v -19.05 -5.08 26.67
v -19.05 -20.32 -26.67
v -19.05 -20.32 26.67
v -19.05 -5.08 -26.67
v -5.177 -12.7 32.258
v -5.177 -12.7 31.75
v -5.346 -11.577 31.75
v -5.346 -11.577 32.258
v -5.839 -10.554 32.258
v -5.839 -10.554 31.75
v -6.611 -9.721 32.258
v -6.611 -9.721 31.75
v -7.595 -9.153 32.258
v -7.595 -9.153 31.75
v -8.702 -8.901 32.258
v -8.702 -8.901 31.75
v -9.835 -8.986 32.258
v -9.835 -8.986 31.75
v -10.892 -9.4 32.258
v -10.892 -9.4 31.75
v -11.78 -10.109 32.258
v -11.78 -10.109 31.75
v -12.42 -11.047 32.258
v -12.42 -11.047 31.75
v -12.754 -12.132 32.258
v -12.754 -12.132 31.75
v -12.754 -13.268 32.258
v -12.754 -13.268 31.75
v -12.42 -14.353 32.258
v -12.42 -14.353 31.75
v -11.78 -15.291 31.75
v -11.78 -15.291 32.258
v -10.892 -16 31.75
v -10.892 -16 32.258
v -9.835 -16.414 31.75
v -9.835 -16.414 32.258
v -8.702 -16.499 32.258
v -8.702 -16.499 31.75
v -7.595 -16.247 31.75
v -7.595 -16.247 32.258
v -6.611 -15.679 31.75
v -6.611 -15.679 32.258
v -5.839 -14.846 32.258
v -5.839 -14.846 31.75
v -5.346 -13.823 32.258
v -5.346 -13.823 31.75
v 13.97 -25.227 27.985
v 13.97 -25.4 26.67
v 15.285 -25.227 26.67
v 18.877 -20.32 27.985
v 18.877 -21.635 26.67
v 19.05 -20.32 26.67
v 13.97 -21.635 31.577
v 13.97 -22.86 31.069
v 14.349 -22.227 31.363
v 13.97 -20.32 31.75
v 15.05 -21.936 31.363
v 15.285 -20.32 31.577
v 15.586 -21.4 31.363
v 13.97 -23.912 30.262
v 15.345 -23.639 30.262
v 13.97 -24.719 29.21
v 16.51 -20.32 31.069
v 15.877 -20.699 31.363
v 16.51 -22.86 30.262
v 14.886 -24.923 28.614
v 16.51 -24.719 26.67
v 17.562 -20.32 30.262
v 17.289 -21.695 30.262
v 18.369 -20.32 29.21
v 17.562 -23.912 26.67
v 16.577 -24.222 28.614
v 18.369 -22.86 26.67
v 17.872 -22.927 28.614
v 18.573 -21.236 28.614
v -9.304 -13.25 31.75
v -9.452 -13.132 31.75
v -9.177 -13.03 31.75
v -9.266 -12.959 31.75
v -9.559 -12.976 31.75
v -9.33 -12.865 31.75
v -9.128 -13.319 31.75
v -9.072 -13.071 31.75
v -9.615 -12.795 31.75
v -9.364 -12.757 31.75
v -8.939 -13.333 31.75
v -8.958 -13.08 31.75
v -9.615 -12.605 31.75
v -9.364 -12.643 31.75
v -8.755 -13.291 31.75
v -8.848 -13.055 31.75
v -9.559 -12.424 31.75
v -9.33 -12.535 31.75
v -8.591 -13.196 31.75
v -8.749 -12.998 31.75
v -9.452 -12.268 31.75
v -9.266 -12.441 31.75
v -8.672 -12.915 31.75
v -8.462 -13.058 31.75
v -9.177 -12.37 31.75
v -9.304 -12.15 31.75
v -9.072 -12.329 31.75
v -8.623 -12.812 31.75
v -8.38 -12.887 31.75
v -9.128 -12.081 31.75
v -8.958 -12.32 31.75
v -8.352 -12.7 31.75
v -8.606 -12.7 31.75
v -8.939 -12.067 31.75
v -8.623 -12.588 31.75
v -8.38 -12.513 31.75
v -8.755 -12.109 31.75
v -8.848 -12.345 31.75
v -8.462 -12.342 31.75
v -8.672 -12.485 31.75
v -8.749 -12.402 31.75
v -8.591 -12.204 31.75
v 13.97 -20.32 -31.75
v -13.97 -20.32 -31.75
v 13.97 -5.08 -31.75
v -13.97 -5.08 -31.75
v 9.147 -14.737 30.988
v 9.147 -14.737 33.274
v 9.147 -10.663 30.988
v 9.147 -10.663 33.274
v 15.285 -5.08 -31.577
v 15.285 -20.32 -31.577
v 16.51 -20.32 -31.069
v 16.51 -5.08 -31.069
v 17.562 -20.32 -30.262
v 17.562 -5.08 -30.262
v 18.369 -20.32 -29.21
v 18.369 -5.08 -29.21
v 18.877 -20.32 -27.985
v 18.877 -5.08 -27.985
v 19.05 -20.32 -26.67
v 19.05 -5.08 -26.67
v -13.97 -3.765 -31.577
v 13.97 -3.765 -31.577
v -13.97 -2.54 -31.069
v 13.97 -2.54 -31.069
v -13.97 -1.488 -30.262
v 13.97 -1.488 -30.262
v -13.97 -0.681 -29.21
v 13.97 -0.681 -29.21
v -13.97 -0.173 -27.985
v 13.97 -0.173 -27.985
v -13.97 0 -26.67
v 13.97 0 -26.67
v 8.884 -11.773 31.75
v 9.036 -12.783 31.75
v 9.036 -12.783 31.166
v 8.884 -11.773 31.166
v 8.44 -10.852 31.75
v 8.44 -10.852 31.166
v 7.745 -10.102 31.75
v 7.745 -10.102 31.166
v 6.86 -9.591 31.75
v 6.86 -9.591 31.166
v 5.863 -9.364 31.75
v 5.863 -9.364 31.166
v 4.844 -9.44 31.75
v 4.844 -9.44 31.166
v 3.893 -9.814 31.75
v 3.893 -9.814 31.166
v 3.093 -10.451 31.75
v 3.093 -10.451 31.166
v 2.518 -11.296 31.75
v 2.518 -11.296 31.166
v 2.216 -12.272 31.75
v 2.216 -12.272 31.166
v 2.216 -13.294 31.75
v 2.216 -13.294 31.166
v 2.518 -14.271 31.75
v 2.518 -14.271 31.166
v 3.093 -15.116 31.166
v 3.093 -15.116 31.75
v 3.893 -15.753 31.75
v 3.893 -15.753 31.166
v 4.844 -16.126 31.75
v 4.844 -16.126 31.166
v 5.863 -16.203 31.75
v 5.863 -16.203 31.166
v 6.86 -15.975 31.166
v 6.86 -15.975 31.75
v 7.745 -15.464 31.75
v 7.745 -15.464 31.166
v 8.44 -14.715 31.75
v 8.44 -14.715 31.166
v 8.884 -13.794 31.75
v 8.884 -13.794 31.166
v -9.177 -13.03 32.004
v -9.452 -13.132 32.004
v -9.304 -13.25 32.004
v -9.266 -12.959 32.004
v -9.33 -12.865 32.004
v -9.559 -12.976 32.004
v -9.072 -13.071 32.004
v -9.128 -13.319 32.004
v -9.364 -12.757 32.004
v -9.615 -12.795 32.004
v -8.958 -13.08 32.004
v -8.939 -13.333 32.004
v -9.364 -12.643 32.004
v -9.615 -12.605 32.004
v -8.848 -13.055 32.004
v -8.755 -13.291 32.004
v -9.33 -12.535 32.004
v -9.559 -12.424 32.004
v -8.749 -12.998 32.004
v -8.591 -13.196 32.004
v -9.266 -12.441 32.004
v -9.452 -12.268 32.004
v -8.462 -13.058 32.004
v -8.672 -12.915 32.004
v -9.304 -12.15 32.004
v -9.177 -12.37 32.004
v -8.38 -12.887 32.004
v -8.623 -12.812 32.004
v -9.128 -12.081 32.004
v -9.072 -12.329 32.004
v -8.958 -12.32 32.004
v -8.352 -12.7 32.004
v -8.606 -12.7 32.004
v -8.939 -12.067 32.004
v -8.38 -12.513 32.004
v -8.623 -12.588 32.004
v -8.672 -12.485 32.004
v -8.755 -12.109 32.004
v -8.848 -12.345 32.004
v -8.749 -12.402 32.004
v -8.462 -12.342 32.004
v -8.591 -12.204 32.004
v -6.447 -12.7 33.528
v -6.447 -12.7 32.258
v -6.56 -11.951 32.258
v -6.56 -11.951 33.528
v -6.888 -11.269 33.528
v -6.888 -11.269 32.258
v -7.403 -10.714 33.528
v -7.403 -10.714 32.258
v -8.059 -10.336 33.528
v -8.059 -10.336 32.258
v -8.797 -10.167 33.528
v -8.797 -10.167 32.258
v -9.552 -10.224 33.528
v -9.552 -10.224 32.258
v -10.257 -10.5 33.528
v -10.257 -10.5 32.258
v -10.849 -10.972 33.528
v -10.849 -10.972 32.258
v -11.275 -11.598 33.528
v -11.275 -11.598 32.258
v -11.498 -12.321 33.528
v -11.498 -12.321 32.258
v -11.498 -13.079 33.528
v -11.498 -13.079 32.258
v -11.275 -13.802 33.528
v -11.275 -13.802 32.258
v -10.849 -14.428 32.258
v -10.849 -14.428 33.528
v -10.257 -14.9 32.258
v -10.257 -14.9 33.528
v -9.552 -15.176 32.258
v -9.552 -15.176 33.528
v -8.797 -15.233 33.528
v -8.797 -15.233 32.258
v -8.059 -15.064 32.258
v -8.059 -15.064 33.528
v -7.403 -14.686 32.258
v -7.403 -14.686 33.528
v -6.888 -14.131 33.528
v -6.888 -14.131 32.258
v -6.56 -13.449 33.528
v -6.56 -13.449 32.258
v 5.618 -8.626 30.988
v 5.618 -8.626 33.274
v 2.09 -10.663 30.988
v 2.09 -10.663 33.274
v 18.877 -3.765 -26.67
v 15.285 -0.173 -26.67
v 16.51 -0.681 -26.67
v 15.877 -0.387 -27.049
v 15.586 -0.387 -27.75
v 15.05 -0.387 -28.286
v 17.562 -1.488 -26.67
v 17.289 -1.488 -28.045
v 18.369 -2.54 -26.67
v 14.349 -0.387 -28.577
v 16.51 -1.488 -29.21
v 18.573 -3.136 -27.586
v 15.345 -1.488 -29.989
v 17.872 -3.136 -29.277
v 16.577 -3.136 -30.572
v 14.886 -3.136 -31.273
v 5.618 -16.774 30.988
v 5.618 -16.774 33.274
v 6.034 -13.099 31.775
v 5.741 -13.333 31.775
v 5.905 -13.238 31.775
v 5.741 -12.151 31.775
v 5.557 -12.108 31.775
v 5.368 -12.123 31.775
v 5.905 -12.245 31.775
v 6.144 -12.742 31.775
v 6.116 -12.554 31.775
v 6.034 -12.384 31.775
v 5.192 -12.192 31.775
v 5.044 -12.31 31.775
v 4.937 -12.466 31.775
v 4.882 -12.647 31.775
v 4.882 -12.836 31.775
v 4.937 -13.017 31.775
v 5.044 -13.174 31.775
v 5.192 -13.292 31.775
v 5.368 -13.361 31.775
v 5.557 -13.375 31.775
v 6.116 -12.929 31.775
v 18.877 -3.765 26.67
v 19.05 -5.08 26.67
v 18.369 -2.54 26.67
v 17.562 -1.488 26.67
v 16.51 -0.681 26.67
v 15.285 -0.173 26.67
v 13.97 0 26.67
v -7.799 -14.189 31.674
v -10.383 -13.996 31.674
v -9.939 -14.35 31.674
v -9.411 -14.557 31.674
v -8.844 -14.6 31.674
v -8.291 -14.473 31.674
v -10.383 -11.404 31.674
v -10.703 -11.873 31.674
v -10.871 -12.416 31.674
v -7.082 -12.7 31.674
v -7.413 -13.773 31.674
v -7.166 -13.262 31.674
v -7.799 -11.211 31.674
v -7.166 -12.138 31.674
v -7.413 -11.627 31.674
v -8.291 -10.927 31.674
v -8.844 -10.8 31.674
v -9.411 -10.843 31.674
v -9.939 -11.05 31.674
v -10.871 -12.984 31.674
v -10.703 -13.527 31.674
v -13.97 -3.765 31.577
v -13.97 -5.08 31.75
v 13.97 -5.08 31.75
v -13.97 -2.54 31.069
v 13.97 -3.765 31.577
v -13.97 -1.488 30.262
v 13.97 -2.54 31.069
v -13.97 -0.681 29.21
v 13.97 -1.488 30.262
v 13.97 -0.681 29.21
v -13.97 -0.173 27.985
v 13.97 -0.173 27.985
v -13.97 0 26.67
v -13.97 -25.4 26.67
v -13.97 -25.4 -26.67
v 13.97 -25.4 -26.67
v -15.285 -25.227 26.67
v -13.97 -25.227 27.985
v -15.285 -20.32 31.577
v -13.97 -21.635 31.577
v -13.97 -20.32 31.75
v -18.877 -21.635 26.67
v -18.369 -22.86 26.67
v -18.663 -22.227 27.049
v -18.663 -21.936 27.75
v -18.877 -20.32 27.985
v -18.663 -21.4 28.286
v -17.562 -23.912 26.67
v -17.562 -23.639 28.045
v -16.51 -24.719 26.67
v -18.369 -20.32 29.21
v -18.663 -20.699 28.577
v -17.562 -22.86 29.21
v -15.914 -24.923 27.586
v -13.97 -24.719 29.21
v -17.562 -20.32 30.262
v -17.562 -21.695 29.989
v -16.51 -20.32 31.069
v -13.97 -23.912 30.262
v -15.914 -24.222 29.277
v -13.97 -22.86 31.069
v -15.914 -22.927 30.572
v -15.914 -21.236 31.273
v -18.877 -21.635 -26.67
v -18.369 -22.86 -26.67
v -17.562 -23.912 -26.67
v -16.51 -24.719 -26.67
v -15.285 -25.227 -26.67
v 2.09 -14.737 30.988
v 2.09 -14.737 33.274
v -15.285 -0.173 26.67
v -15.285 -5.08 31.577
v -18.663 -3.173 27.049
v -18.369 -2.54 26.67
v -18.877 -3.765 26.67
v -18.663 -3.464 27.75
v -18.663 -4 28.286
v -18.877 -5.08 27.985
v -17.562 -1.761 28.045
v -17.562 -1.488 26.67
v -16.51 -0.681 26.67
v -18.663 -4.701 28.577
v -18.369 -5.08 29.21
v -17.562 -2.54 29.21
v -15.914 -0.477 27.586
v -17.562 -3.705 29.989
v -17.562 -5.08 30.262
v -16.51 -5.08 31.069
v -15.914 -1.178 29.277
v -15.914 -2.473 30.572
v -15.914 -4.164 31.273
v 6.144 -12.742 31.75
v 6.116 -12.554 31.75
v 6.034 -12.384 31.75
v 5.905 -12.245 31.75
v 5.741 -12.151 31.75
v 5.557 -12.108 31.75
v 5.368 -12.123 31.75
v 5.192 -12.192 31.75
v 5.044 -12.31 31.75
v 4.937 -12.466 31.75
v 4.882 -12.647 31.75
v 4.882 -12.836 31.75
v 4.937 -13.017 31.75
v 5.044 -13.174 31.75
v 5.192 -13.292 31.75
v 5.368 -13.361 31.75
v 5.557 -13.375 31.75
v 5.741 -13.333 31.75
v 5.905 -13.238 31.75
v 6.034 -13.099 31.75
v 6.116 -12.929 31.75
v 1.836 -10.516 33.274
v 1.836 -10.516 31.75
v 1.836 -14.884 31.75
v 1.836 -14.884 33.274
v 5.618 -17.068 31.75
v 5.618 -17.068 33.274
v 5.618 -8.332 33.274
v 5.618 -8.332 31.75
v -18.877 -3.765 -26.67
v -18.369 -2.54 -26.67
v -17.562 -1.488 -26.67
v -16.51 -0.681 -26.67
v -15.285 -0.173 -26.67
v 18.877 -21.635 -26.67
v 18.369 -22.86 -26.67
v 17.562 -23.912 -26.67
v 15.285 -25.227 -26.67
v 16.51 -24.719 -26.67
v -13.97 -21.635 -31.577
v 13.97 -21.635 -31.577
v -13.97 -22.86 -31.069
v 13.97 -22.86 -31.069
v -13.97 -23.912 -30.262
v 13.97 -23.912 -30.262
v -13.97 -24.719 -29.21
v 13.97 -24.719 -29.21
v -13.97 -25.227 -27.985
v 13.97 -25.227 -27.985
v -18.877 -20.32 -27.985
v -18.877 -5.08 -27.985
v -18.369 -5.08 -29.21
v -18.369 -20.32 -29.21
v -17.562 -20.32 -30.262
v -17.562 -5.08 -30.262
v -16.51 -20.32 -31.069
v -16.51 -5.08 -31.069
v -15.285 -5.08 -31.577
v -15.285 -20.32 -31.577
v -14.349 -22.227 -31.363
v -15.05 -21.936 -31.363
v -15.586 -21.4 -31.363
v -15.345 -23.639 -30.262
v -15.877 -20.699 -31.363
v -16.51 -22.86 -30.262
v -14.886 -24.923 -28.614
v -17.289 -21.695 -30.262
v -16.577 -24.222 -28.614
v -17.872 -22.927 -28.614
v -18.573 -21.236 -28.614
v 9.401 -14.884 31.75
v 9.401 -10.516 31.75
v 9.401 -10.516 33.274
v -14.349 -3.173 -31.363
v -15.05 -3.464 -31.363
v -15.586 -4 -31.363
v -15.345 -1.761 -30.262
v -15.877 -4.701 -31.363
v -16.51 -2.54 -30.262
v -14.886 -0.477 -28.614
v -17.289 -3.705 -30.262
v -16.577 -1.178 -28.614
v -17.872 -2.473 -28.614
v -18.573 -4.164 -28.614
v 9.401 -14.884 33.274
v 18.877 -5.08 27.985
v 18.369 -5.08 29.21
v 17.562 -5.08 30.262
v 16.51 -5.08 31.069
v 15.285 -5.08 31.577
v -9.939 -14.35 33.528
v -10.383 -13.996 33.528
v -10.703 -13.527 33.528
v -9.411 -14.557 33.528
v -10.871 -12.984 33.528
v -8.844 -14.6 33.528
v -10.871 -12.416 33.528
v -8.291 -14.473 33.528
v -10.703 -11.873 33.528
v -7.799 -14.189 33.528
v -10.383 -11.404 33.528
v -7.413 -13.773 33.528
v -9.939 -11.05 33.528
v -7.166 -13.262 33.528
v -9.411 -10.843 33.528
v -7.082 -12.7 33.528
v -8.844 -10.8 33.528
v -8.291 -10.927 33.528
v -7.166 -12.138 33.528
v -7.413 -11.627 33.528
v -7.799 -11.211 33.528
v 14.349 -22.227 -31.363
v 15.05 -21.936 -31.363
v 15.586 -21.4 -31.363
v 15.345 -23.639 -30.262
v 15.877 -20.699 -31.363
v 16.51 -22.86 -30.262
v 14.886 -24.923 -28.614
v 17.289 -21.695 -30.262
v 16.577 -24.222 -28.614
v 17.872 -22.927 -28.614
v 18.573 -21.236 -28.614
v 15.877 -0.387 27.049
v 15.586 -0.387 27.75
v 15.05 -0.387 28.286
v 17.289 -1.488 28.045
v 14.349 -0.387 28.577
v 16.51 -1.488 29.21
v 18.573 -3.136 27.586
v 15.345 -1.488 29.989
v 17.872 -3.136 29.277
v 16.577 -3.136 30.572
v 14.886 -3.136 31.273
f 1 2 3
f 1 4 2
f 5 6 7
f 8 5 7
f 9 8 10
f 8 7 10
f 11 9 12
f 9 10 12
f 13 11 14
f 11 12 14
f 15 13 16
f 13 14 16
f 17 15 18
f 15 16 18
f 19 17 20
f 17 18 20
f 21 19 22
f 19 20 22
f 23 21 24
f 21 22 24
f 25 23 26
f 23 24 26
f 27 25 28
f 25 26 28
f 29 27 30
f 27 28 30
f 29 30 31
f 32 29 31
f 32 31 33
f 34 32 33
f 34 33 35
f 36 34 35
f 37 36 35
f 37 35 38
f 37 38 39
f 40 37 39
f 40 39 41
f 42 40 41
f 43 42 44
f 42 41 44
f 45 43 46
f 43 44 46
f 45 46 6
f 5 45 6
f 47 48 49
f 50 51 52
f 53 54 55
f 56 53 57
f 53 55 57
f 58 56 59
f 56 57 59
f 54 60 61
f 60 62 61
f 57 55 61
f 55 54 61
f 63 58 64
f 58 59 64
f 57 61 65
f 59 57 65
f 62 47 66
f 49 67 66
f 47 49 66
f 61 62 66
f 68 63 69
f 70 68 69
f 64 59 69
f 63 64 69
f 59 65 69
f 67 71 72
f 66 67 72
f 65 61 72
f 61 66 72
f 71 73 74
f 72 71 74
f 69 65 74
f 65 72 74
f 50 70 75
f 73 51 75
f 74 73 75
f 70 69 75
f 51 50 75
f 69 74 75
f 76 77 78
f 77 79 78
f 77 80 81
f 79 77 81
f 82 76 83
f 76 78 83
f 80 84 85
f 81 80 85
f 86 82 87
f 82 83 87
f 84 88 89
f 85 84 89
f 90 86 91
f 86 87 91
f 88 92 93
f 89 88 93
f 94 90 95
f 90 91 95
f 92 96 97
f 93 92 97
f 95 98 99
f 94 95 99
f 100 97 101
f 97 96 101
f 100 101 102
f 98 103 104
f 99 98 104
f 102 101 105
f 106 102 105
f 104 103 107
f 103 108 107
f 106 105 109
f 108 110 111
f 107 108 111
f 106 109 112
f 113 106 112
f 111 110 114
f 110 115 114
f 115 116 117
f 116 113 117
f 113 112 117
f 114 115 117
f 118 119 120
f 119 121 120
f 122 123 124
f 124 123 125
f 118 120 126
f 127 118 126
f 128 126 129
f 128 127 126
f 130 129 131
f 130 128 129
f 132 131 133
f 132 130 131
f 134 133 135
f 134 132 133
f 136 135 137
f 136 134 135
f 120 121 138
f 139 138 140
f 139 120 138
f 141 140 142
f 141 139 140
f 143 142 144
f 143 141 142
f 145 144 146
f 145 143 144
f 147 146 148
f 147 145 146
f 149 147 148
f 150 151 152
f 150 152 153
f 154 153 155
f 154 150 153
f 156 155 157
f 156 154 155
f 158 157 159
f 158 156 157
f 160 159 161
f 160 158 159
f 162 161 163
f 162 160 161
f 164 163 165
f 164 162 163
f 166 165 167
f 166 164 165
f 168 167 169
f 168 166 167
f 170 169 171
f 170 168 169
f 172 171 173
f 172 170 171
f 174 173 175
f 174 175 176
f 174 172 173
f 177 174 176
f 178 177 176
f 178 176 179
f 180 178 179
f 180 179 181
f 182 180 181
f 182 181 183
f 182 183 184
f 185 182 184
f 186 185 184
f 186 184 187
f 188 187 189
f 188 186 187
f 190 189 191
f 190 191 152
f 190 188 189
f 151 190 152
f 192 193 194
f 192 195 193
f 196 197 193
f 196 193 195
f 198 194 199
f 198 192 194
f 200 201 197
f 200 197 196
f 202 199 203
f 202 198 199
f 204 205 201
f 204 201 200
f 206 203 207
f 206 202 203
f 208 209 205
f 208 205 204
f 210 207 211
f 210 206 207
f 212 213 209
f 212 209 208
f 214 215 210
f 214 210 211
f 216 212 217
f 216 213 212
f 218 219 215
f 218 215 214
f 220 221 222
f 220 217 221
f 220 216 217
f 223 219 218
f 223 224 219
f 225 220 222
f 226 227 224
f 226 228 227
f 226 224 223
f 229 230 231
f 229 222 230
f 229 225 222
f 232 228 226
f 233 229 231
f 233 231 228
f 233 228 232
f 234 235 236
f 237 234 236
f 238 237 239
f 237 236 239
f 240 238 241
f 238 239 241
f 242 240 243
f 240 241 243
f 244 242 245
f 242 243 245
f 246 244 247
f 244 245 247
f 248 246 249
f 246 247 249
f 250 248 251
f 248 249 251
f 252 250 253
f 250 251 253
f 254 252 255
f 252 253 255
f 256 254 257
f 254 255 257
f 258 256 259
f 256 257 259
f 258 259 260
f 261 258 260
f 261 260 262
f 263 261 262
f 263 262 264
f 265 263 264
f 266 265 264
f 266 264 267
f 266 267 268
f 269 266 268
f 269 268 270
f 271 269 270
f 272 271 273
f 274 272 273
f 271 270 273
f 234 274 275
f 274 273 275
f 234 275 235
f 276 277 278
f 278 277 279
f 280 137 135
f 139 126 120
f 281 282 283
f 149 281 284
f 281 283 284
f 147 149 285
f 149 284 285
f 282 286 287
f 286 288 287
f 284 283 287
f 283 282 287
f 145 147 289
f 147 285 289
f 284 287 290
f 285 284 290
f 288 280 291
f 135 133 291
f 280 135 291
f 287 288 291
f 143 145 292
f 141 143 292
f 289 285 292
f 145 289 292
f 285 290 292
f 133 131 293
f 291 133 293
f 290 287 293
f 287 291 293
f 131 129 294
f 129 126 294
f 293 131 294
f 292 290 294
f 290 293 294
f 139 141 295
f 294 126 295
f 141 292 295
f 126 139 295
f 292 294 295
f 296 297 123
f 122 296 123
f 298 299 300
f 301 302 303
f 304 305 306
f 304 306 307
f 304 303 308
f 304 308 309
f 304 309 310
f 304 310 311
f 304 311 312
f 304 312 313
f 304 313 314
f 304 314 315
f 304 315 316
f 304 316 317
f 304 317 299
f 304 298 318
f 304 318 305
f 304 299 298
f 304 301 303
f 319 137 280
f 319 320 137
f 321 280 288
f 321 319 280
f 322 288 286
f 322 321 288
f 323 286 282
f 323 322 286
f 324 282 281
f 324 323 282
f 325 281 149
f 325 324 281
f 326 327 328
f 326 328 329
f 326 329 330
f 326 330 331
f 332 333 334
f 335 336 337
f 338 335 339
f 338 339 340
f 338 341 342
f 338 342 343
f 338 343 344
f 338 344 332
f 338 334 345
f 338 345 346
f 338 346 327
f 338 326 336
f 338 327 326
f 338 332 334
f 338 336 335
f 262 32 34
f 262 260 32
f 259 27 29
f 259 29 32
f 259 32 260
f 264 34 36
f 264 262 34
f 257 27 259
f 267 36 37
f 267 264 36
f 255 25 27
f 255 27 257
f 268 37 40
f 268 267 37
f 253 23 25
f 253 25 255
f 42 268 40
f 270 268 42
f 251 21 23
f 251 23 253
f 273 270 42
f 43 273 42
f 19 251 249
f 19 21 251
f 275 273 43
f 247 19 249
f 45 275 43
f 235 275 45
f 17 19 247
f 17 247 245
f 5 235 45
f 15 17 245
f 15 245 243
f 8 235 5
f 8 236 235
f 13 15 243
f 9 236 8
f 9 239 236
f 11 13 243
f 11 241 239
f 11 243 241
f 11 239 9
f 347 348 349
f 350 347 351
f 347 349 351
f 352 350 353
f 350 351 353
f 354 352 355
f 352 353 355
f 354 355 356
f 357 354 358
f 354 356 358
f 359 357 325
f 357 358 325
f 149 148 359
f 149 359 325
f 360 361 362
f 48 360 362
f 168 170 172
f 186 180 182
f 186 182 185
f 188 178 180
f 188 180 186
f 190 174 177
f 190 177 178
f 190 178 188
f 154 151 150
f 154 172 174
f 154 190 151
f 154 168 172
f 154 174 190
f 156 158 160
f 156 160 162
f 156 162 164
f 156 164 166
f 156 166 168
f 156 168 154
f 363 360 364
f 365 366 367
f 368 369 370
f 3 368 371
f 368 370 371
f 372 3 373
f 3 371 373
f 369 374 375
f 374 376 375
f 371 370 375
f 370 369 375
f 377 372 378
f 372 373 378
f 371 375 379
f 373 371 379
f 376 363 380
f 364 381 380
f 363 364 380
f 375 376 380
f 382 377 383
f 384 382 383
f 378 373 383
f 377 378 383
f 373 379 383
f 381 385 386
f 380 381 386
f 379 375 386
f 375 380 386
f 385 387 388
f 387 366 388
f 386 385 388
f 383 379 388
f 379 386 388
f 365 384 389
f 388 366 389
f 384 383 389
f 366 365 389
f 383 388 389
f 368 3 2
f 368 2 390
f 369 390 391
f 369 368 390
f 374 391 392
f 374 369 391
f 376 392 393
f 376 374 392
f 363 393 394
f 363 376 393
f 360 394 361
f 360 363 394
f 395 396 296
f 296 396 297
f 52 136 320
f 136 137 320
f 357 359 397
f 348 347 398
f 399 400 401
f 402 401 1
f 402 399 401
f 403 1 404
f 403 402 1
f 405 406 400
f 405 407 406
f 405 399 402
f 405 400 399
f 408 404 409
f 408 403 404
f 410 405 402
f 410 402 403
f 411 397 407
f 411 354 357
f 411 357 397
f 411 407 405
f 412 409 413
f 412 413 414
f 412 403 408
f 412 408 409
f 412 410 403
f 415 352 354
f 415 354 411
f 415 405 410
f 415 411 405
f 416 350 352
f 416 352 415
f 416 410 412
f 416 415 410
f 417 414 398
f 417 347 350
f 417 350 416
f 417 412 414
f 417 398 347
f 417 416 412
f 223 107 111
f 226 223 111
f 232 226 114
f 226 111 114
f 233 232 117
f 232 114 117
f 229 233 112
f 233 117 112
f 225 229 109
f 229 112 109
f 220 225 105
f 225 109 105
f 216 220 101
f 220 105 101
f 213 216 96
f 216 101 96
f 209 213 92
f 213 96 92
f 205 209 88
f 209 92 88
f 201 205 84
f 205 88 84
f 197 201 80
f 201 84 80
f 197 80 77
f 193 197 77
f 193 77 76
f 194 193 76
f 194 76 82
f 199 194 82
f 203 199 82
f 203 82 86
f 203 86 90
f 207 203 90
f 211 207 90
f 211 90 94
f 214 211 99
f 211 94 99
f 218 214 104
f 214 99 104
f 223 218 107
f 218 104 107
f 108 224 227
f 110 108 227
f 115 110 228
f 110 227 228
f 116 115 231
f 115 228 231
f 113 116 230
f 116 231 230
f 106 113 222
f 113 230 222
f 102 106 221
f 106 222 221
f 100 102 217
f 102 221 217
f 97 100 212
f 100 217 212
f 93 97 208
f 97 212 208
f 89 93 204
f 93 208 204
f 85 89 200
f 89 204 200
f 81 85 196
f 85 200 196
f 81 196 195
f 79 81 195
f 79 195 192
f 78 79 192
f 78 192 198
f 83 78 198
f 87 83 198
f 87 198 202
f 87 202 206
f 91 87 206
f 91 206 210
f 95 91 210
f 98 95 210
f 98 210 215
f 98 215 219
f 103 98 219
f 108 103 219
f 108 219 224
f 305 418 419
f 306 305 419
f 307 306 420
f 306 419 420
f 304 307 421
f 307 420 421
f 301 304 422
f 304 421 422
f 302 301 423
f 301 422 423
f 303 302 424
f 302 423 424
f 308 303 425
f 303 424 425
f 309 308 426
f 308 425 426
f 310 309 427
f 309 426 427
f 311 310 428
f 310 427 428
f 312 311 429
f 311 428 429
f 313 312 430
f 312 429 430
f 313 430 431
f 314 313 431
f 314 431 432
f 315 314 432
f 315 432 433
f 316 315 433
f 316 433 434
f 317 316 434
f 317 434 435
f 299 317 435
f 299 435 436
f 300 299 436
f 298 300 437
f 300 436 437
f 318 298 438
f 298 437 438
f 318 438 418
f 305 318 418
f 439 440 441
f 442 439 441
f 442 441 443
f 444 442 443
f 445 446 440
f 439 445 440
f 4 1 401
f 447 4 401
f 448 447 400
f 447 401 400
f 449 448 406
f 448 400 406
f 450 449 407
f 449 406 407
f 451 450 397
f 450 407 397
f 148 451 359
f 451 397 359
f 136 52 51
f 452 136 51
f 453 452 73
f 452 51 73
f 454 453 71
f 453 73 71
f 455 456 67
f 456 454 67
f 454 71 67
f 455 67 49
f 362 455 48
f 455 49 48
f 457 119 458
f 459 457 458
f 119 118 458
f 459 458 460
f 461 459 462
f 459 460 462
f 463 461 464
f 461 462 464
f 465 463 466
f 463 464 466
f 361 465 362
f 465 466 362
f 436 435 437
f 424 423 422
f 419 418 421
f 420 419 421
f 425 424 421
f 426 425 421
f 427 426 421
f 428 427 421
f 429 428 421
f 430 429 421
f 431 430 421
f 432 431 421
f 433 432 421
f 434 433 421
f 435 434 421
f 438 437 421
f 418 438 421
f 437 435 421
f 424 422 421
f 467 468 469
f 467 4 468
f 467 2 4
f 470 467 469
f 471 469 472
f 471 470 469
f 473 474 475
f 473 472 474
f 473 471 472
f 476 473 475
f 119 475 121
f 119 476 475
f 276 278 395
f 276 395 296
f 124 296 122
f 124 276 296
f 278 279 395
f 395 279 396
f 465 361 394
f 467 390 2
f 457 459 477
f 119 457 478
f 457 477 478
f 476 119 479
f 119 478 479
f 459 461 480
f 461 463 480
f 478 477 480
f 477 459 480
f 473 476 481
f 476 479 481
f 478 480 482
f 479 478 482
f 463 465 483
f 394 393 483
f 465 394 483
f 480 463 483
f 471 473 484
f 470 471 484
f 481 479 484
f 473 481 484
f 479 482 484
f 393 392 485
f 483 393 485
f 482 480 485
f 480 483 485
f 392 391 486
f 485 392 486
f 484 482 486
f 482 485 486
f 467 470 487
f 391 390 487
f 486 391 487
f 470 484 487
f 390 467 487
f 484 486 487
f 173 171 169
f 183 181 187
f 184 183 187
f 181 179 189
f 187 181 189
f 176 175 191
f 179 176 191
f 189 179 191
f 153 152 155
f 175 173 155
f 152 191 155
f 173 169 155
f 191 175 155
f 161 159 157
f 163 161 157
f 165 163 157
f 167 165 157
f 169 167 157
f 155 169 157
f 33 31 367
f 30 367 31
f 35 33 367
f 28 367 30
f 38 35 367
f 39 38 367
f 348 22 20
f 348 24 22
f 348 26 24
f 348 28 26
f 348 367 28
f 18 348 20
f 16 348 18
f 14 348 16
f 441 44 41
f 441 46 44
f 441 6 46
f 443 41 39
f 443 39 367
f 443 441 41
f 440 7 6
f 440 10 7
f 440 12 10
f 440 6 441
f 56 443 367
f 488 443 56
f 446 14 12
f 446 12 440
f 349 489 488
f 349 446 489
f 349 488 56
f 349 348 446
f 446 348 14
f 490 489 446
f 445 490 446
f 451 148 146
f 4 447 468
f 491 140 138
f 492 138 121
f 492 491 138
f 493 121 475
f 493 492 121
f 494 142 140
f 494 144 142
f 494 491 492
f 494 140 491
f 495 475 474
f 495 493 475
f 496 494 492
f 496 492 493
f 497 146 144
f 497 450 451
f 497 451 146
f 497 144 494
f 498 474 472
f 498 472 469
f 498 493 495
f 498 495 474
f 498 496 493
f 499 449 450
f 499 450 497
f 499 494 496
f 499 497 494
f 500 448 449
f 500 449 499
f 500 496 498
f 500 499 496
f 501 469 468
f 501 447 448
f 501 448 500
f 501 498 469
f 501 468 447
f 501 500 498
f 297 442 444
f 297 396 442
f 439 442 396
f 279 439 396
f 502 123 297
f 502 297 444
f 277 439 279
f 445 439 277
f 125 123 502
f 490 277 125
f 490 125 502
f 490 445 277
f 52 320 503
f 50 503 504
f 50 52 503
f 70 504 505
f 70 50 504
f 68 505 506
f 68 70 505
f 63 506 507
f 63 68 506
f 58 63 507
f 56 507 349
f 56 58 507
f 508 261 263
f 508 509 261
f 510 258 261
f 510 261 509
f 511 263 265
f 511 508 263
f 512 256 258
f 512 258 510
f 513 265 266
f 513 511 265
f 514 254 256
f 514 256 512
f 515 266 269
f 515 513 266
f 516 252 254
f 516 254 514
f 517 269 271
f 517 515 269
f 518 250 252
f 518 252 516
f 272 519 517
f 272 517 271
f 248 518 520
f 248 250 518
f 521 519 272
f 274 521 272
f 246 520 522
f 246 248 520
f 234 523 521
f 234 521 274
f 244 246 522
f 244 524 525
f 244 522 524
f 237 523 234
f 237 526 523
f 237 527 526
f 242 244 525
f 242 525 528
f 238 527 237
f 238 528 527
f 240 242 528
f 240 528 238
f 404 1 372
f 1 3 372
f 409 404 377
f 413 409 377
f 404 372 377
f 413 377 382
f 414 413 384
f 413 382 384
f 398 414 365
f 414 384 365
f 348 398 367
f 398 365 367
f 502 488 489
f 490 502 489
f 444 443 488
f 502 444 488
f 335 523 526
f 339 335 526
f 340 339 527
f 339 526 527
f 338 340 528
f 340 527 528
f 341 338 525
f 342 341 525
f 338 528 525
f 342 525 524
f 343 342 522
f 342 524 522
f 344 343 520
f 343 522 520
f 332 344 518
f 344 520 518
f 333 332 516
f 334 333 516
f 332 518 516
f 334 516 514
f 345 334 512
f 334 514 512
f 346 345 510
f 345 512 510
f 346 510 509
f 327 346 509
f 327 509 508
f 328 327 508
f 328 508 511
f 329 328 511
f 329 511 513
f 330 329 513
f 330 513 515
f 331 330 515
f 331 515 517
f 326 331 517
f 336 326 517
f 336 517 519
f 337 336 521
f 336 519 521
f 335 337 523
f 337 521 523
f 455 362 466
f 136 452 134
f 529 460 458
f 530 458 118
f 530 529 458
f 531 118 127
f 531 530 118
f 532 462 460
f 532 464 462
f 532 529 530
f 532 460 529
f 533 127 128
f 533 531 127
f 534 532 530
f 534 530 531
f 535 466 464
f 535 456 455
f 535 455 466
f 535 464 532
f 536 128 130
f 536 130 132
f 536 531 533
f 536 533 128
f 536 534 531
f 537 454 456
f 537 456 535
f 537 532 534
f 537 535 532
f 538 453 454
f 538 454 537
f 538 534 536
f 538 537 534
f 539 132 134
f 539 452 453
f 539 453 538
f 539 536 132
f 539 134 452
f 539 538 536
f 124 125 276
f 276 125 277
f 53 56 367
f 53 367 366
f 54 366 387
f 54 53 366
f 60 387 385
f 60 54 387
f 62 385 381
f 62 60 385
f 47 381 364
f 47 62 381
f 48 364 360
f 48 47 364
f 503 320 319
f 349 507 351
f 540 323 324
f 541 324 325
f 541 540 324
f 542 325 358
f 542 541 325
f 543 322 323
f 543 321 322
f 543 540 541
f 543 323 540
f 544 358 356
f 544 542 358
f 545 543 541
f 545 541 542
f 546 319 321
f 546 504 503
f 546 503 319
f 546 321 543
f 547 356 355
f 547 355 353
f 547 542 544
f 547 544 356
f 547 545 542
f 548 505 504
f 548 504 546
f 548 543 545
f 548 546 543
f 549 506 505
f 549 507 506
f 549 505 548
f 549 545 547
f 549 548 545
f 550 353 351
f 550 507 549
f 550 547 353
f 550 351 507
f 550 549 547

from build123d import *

# Parameters (mm, degrees)
F0_W      = 38.1
F0_H      = 63.5
F1_DEPTH  = 25.4
F2_R      = 5.08
F3_R      = 3.81
F4_DEPTH  = 0.508
F5_R      = 2.54
F6_DEPTH  = 1.27
F7_R      = 1.905
F8_DEPTH  = 1.8542
F10_DEPTH = 1.524
F13_DEPTH = 2.286
F14_R     = 3.429
F15_DEPTH = 0.5842
F16_R     = 0.635
F17_DEPTH = 0.0254
F18_R     = 0.635
F19_DEPTH = 0.254
F20_R     = 0.381
F21_DEPTH = 3.8354


with BuildPart() as f1:
    # F0 (on Front) → F1 (new body)
    with BuildSketch(Plane.XZ):
        Rectangle(F0_W, F0_H)
    extrude(amount=F1_DEPTH)

    # F2
    f2_edges = [f1.edges().sort_by_distance(p)[0] for p in [
        (19.05, -25.4, 0),
        (0, -25.4, 31.75),
        (-19.05, -25.4, 0),
        (0, -25.4, -31.75),
        (19.05, -12.7, -31.75),
        (19.05, -12.7, 31.75),
        (19.05, 0, 0),
        (0, 0, 31.75),
        (-19.05, 0, 0),
        (0, 0, -31.75),
        (-19.05, -12.7, 31.75),
        (-19.05, -12.7, -31.75),
    ]]
    fillet(f2_edges, radius=F2_R)

    # F3 (on face) → F4 (join)
    with BuildSketch(Plane.XY.offset(31.75)):
        with Locations((-8.9868323129, -12.7)):
            Circle(F3_R)
    extrude(amount=F4_DEPTH)

    # F5 (on face) → F6 (join)
    with BuildSketch(Plane.XY.offset(32.258)):
        with Locations((-8.9868323129, -12.7)):
            Circle(F5_R)
    extrude(amount=F6_DEPTH)

    # F7 (on face) → F8 (cut, symmetric)
    with BuildSketch(Plane.XY.offset(33.528)):
        with Locations((-8.9868323129, -12.7)):
            Circle(F7_R)
    extrude(amount=F8_DEPTH, both=True, mode=Mode.SUBTRACT)

    # F9 (on face) → F10 (join)
    with BuildSketch(Plane.XY.offset(31.75)):
        Polygon((9.4006182914, -14.8837988746), (9.4006182914, -10.5162011254), (5.6181676871, -8.3324022508), (1.8357170827, -10.5162011254), (1.8357170827, -14.8837988746), (5.6181676871, -17.0675977492), align=None)
    extrude(amount=F10_DEPTH)

    # F12 (on face) → F13 (cut)
    with BuildSketch(Plane.XY.offset(33.274)):
        Polygon((9.1466182914, -10.6628480938), (5.6181676871, -8.6256961876), (2.0897170827, -10.6628480938), (2.0897170827, -14.7371519062), (5.6181676871, -16.7743038124), (9.1466182914, -14.7371519062), align=None)
    extrude(amount=-F13_DEPTH, mode=Mode.SUBTRACT)


with BuildPart() as f15:
    # F14 (on face) → F15 (new body)
    with BuildSketch(Plane.XY.offset(31.75)):
        with Locations((5.6070124581, -12.7833363355)):
            Circle(F14_R)
    extrude(amount=-F15_DEPTH)


with BuildPart() as f17:
    # F16 (on face) → F17 (new body)
    with BuildSketch(Plane.XY.offset(31.75)):
        with Locations((5.5094454437, -12.7416318282)):
            Circle(F16_R)
    extrude(amount=F17_DEPTH)


with BuildPart() as f19:
    # F18 (on face) → F19 (new body)
    with BuildSketch(Plane.XY.offset(31.75)):
        with Locations((-8.9868323129, -12.7)):
            Circle(F18_R)
    extrude(amount=F19_DEPTH)

    # F20 (on face) → F21 (cut)
    with BuildSketch(Plane.XY.offset(32.004)):
        with Locations((-8.9868323129, -12.7)):
            Circle(F20_R)
    extrude(amount=-F21_DEPTH, mode=Mode.SUBTRACT)


solid = Compound([f1.part, f15.part, f17.part, f19.part])
